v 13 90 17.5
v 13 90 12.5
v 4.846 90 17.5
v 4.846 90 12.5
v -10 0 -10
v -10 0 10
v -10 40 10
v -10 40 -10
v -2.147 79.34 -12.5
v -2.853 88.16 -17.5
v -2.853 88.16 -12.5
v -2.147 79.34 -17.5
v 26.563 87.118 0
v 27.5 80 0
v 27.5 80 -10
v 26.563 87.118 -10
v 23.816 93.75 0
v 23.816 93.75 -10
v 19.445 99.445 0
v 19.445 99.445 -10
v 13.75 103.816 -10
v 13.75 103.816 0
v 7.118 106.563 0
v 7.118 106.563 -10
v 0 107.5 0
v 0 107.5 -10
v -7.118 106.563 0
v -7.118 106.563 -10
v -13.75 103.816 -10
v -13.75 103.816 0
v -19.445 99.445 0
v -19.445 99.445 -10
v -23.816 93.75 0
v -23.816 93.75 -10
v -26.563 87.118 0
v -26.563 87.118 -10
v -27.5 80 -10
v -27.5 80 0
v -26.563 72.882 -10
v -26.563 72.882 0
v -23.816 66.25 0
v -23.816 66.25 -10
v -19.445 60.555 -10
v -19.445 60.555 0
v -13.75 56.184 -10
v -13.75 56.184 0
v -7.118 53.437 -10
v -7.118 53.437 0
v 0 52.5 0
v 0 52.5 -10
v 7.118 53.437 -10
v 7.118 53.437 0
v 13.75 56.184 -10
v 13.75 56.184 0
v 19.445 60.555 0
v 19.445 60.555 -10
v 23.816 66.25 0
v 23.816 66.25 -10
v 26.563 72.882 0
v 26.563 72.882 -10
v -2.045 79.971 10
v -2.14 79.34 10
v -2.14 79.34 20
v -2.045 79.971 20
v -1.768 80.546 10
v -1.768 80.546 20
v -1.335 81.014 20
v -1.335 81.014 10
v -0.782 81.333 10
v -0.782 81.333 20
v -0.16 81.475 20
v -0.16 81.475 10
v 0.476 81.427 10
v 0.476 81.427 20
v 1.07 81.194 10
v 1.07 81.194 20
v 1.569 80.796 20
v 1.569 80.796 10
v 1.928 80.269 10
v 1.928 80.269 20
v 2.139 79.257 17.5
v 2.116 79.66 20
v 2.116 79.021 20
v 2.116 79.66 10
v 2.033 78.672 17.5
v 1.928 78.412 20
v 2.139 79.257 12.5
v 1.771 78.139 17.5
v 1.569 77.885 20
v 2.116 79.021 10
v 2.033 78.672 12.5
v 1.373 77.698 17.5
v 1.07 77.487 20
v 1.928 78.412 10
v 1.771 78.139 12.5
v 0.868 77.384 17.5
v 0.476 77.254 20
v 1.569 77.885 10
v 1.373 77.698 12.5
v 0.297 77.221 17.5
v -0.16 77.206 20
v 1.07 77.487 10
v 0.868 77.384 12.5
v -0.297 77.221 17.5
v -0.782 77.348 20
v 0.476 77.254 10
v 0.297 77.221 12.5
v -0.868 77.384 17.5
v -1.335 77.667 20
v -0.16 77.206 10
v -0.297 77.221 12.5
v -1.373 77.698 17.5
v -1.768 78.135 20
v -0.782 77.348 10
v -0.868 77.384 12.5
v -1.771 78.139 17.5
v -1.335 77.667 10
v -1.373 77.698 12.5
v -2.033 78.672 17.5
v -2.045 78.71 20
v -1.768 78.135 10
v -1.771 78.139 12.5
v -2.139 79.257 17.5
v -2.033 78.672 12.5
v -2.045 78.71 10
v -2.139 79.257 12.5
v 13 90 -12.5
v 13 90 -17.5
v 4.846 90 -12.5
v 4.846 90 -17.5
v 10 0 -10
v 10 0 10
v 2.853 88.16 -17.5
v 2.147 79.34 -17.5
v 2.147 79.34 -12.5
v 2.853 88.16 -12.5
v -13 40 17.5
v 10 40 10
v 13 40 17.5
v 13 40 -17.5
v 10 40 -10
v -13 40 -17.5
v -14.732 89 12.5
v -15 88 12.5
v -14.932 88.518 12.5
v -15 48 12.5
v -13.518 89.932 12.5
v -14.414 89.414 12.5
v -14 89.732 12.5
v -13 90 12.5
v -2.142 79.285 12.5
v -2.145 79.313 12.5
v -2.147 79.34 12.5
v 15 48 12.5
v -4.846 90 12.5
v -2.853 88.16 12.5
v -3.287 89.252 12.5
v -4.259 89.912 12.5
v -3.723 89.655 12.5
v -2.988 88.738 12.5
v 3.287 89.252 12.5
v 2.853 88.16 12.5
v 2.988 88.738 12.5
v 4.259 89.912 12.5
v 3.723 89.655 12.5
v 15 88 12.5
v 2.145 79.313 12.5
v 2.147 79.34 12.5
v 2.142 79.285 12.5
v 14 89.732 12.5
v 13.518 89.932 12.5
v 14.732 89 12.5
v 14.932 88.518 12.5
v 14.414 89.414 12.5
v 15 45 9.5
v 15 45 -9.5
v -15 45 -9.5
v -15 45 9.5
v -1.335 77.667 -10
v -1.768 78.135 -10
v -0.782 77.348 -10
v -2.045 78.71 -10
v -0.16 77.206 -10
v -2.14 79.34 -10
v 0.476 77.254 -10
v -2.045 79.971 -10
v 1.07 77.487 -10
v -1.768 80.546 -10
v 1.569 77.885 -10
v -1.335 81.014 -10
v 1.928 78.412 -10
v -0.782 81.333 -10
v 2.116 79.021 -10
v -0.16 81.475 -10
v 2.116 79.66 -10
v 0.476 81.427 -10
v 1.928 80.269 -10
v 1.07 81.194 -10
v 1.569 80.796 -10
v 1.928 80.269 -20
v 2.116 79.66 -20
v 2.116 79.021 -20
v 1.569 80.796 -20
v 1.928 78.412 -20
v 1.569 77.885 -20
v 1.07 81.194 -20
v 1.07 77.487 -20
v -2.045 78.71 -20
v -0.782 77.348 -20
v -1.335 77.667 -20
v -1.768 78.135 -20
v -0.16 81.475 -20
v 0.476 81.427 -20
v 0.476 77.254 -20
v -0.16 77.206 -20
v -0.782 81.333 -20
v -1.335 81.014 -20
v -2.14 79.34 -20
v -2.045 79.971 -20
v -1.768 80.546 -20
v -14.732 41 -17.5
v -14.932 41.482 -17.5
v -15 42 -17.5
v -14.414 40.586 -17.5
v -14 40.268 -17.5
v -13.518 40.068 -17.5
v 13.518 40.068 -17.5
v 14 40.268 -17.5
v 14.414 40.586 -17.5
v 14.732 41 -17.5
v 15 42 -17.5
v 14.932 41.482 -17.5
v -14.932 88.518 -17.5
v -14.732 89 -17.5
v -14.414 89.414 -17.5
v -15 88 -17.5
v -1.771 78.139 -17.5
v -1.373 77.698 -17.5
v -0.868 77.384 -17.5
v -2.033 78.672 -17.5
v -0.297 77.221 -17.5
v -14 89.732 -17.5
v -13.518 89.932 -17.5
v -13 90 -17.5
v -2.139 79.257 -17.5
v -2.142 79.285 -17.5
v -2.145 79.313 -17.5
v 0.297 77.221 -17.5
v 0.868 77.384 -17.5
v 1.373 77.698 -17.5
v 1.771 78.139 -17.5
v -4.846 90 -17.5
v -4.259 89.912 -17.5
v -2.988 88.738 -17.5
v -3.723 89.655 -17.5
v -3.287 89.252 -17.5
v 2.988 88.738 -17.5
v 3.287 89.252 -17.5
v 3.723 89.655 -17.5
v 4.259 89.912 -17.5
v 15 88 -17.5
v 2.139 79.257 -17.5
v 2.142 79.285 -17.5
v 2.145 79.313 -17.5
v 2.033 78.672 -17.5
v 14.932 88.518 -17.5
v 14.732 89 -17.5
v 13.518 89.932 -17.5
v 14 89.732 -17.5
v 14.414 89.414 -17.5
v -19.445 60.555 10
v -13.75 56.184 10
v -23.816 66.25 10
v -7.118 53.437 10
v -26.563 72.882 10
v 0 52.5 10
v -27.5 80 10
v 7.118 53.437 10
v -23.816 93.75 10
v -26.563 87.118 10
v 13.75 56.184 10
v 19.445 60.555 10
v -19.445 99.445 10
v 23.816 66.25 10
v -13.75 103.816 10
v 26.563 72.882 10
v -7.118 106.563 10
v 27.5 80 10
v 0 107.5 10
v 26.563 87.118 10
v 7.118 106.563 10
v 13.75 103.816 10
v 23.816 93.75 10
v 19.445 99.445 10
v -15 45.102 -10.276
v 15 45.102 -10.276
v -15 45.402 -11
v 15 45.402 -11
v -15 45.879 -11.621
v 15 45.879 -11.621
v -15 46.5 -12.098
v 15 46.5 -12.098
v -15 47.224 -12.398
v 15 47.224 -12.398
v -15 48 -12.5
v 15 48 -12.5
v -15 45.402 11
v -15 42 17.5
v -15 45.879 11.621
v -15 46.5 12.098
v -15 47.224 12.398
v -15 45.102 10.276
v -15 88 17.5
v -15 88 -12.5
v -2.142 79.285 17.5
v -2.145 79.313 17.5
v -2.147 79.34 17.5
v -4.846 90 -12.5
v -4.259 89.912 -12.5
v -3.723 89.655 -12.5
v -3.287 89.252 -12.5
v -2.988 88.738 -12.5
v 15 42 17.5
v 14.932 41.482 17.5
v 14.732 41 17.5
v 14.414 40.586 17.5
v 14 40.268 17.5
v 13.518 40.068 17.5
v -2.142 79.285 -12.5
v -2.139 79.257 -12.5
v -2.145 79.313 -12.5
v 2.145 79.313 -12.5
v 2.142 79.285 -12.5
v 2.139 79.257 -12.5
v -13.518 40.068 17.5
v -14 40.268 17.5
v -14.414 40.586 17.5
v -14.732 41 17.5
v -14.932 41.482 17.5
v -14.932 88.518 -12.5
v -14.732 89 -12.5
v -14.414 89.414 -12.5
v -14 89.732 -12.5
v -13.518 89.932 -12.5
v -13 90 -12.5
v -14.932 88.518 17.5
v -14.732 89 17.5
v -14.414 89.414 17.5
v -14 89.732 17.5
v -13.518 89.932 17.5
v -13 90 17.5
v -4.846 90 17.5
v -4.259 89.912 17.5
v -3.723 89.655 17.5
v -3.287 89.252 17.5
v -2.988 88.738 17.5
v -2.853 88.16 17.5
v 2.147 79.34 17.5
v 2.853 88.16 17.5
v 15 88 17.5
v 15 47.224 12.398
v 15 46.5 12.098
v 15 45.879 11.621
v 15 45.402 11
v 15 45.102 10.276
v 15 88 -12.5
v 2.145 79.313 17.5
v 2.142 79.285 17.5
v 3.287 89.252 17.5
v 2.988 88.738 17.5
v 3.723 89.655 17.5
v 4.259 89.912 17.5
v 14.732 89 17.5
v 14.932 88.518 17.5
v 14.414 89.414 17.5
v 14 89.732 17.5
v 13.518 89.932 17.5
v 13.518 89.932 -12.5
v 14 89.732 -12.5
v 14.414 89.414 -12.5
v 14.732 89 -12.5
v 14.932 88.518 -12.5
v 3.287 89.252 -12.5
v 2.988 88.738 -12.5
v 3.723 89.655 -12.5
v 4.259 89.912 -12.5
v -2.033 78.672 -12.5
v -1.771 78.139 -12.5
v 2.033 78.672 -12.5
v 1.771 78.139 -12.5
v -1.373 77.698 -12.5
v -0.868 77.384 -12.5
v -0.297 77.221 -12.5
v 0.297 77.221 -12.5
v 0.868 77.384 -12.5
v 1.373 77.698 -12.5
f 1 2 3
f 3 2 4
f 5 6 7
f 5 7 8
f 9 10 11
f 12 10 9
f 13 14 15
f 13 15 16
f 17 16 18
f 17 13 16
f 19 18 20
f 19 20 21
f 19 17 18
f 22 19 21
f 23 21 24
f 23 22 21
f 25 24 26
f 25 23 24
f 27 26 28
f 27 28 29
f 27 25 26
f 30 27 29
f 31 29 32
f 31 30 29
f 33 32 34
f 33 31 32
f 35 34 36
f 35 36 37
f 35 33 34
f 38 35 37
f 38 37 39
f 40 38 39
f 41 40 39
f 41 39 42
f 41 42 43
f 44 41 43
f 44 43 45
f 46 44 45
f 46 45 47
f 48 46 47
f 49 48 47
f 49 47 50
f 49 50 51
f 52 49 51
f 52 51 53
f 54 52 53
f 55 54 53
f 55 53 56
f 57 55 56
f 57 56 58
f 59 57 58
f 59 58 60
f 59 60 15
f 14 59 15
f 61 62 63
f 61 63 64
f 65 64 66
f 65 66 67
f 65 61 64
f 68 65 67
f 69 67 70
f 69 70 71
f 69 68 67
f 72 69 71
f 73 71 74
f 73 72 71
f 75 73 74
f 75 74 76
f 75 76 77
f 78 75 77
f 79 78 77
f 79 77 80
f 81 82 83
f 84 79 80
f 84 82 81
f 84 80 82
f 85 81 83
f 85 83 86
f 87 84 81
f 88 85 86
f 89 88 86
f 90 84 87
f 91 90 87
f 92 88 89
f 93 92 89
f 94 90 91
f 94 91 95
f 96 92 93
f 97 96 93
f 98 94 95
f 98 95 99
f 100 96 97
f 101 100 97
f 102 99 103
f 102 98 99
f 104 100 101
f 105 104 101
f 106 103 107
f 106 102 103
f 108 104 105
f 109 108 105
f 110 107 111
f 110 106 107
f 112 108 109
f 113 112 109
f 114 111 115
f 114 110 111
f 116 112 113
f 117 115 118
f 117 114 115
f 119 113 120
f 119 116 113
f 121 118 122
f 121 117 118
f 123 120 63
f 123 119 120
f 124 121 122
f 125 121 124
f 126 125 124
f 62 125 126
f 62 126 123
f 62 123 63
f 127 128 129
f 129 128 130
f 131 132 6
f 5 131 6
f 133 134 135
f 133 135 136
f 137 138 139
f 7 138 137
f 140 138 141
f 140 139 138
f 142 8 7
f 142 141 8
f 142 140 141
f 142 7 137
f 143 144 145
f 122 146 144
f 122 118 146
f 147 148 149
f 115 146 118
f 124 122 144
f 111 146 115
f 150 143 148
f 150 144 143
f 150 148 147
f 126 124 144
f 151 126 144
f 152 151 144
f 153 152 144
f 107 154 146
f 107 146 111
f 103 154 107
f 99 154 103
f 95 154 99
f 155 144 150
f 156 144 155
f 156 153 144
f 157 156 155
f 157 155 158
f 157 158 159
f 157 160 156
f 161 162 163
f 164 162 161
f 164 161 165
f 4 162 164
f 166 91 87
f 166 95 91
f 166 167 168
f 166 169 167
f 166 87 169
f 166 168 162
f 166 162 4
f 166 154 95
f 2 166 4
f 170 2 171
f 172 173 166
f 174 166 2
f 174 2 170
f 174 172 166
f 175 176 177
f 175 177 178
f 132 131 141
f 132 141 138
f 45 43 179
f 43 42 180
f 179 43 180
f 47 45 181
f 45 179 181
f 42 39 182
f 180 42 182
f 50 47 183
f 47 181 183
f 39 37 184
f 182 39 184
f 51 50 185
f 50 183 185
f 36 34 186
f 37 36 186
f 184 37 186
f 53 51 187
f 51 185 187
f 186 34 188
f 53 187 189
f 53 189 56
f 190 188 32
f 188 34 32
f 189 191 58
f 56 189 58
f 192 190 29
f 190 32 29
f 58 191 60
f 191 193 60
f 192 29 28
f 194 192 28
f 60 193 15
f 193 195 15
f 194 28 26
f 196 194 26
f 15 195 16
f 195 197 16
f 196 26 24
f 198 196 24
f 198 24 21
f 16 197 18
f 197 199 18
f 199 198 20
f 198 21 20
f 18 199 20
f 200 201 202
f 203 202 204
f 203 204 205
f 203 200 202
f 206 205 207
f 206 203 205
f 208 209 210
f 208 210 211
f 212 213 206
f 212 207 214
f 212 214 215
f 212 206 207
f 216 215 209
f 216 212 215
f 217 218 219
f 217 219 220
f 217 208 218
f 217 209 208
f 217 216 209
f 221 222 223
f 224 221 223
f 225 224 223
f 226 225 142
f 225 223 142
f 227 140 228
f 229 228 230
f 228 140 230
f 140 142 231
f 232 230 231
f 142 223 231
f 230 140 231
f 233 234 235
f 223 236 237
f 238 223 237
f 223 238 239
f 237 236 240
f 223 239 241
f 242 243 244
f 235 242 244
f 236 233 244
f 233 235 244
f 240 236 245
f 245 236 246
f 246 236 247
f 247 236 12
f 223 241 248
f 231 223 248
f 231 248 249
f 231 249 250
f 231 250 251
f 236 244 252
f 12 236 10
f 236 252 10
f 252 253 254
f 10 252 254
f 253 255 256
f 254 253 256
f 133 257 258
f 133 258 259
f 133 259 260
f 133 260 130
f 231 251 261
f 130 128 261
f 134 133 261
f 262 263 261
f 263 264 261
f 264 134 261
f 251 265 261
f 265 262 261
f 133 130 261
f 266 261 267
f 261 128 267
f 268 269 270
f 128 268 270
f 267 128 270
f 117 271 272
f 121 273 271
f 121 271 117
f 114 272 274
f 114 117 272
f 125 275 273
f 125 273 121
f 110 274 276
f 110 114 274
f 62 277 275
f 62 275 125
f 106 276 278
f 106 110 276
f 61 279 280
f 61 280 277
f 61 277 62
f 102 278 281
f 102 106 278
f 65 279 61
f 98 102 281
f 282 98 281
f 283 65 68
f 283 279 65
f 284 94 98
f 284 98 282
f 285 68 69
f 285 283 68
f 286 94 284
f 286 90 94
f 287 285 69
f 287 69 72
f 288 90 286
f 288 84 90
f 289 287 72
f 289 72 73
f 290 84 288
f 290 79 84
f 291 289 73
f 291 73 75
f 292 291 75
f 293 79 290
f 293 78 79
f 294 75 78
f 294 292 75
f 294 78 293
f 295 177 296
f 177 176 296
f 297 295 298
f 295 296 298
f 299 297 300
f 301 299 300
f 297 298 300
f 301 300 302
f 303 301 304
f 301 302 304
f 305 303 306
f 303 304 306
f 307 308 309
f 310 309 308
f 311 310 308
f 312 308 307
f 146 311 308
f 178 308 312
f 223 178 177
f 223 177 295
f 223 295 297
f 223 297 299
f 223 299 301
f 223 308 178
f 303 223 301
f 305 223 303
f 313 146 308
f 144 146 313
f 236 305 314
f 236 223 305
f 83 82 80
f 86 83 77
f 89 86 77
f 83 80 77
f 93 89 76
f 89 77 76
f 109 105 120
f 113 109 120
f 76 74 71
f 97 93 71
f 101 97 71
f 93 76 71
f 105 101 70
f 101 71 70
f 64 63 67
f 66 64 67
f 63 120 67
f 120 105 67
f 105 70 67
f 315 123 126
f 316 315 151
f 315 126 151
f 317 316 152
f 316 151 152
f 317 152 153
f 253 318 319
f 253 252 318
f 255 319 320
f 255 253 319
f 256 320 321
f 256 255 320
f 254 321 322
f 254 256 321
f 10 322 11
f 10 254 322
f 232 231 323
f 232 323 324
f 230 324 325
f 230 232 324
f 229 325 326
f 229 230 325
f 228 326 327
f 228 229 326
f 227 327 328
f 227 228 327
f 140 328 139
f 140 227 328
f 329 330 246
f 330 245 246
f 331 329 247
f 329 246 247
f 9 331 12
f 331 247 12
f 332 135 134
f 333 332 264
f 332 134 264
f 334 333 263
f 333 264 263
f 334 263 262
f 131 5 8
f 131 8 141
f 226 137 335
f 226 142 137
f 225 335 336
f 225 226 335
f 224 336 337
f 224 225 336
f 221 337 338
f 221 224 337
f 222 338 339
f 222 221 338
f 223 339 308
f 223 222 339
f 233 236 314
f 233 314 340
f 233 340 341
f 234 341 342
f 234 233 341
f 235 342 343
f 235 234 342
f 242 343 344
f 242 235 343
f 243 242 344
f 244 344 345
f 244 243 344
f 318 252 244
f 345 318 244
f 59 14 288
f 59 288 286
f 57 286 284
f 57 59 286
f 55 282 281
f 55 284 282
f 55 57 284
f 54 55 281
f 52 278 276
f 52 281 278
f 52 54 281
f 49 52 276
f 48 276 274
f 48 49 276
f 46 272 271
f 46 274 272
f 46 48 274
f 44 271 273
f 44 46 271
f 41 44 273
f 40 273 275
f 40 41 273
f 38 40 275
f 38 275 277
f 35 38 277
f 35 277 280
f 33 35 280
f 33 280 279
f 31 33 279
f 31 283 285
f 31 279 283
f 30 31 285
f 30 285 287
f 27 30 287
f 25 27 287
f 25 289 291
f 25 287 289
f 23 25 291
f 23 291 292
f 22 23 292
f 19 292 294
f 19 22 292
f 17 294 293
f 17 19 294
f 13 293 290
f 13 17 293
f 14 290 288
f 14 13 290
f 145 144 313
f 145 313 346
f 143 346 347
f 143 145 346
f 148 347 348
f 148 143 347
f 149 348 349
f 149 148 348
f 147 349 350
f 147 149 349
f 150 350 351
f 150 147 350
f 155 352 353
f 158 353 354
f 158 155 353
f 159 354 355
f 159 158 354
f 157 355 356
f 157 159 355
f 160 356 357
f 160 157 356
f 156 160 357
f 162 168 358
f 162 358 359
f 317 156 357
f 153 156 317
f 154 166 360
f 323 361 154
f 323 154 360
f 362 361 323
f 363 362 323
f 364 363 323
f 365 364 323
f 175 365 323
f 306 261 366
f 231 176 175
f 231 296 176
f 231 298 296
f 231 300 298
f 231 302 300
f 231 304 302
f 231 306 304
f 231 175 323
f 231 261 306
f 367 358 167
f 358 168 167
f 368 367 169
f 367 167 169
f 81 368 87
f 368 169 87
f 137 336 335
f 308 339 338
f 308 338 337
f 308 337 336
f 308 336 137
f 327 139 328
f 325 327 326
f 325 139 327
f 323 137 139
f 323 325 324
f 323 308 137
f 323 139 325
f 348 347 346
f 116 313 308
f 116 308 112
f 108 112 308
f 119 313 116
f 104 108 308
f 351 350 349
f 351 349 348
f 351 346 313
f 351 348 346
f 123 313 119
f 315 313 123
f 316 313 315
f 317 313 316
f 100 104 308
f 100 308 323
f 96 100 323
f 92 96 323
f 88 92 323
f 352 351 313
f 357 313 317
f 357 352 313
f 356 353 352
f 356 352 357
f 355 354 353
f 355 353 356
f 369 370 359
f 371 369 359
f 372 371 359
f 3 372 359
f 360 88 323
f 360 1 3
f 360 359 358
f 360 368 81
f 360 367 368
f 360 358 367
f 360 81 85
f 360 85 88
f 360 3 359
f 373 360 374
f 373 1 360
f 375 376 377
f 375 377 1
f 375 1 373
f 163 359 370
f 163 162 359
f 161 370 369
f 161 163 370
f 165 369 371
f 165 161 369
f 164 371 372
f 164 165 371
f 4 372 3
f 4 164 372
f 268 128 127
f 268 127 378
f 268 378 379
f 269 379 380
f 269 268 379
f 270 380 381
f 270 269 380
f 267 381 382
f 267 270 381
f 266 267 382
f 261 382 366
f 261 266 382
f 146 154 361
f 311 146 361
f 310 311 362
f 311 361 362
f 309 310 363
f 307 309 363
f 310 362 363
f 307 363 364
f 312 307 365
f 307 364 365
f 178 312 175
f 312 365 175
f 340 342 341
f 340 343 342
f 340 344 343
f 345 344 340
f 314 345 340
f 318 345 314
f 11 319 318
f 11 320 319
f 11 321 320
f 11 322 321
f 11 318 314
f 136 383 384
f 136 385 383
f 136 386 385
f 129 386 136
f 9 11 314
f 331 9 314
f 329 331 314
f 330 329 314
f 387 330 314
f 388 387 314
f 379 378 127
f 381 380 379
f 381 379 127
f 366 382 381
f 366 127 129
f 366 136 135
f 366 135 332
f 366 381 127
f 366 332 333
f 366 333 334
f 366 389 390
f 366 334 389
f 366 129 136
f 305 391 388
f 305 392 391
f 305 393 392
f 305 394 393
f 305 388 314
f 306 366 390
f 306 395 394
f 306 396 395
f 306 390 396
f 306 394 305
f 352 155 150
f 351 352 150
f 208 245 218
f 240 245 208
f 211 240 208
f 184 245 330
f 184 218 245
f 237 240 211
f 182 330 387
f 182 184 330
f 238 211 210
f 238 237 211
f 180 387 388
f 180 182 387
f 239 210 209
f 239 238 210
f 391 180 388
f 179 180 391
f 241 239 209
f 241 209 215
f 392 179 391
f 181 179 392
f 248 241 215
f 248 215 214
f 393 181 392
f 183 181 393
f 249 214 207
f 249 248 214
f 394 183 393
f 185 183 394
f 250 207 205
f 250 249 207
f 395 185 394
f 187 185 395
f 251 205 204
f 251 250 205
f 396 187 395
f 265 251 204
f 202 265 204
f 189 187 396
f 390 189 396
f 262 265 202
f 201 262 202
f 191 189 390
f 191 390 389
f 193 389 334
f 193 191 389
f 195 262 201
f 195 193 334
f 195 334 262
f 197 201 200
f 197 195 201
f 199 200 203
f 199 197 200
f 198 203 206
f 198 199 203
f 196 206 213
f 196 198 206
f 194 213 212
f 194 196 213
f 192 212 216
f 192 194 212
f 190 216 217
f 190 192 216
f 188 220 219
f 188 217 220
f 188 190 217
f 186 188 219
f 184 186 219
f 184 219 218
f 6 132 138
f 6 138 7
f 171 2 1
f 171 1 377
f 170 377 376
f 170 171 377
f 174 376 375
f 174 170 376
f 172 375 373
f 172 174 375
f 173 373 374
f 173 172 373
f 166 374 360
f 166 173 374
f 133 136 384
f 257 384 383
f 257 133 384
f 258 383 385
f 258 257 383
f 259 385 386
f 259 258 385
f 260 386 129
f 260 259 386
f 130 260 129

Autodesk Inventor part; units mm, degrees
ref_plane "YZ Plane" through (0, 0, 0) normal (1, 0, 0) x (0, 1, 0)
ref_plane "XZ Plane" through (0, 0, 0) normal (0, 1, 0) x (-1, 0, 0)
ref_plane "XY Plane" through (0, 0, 0) normal (0, 0, 1) x (1, 0, 0)
sketch "Esquisse2" plane through (0, 0, 0) normal (0, 1, 0) x (-1, 0, 0)
  line L0 (10, -10) -> (-10, -10)
  line L1 (-10, -10) -> (-10, 10)
  line L2 (-10, 10) -> (10, 10)
  line L3 (10, 10) -> (10, -10)
  line L4 (10, -10) -> (-10, 10) construction
  line L5 (-10, -10) -> (10, 10) construction
  point P0 (0, 0)
  dimension "d6" = 20
  dimension "d7" = 20
extrude "Extrusion1" add sketch "Esquisse2" along normal blind 40
sketch "Esquisse3" plane through (0, 0, 0) normal (0, 0, 1) x (1, 0, 0)
  line L0 (-10, 40) -> (10, 40) projected
  line L1 (15, 88) -> (15, 42)
  line L2 (13, 40) -> (-13, 40)
  line L3 (-15, 42) -> (-15, 88)
  line L4 (-15, 90) -> (15, 40) construction
  line L5 (15, 90) -> (-15, 40) construction
  line L6 (13, 90) -> (4.8464, 90)
  line L7 (-4.8464, 90) -> (-13, 90)
  line L8 (-15, 90) -> (-3, 90)
  line L9 (3, 90) -> (15, 90)
  line L10 (-2.8528, 88.1595) -> (-2.1472, 79.3405)
  line L11 (-0.1536, 77.5) -> (0.1536, 77.5)
  line L12 (2.1472, 79.3405) -> (2.8528, 88.1595)
  arc A0 (-13, 90) -> (-15, 88) centre (-13, 88) ccw
  arc A1 (15, 88) -> (13, 90) centre (13, 88) ccw
  arc A2 (-2.1472, 79.3405) -> (-0.1536, 77.5) centre (-0.1536, 79.5) ccw
  arc A3 (0.1536, 77.5) -> (2.1472, 79.3405) centre (0.1536, 79.5) ccw
  arc A4 (-2.8528, 88.1595) -> (-4.8464, 90) centre (-4.8464, 88) ccw
  arc A5 (4.8464, 90) -> (2.8528, 88.1595) centre (4.8464, 88) ccw
  arc A6 (-15, 42) -> (-13, 40) centre (-13, 42) ccw
  arc A7 (13, 40) -> (15, 42) centre (13, 42) ccw
  point P0 (0, 0)
  point P1 (0, 65)
  point P2 (-2, 77.5)
  point P3 (2, 77.5)
  dimension "d10" = 30
  dimension "d11" = 50
  dimension "d12" = 0
  dimension "d23" = 12
  dimension "d24" = 12
  dimension "d27" = 4
  dimension "d28" = 1
  dimension "d29" = 37.5
  dimension "d30" = 2
extrude "Extrusion2" add sketch "Esquisse3" along normal mid plane 35
sketch "Esquisse5" plane through (15, 42, 17.5) normal (1, 0, 0) x (0, 0, -1)
  line L0 (5, 61.6074) -> (30, 61.6074)
  line L1 (30, 61.6074) -> (30, 6)
  line L2 (27, 3) -> (8, 3)
  line L3 (5, 6) -> (5, 61.6074)
  line L4 (5, 61.6074) -> (30, 3) construction
  line L5 (30, 61.6074) -> (5, 3) construction
  line L6 (35, 46) -> (35, 0) projected
  line L7 (35, -2) -> (0, -2) projected
  line L8 (0, 0) -> (0, 46) projected
  arc A0 (5, 6) -> (8, 3) centre (8, 6) ccw
  arc A1 (27, 3) -> (30, 6) centre (27, 6) ccw
  point P0 (17.5, -42)
  point P1 (17.5, 32.3037)
  dimension "d31" = 5
  dimension "d32" = 5
  dimension "d33" = 5
  dimension "d34" = 3
extrude "Extrusion4" cut sketch "Esquisse5" against normal blind 35
sketch "Esquisse6" plane through (0, 0, 0) normal (0, 0, 1) x (1, 0, 0)
  circle A0 centre (0, 80) radius 27.5
  line L0 (13, 40) -> (-13, 40) projected
  point P0 (0, 0)
  dimension "d37" = 55
  dimension "d38" = 40
extrude "Extrusion5" add sketch "Esquisse6" along normal mid plane 20
sketch "Esquisse7" plane through (0, 80, -10) normal (0, 0, -1) x (-1, 0, 0)
  circle A0 centre (0, -0.6595) radius 2.1404
  line L0 (-2.1472, -0.6595) -> (-2.8528, 8.1595) projected
  point P0 (0, -80)
extrude "Extrusion6" add sketch "Esquisse7" along normal blind 10 and the other way blind 30
properties part number "RouleauTendeur"
